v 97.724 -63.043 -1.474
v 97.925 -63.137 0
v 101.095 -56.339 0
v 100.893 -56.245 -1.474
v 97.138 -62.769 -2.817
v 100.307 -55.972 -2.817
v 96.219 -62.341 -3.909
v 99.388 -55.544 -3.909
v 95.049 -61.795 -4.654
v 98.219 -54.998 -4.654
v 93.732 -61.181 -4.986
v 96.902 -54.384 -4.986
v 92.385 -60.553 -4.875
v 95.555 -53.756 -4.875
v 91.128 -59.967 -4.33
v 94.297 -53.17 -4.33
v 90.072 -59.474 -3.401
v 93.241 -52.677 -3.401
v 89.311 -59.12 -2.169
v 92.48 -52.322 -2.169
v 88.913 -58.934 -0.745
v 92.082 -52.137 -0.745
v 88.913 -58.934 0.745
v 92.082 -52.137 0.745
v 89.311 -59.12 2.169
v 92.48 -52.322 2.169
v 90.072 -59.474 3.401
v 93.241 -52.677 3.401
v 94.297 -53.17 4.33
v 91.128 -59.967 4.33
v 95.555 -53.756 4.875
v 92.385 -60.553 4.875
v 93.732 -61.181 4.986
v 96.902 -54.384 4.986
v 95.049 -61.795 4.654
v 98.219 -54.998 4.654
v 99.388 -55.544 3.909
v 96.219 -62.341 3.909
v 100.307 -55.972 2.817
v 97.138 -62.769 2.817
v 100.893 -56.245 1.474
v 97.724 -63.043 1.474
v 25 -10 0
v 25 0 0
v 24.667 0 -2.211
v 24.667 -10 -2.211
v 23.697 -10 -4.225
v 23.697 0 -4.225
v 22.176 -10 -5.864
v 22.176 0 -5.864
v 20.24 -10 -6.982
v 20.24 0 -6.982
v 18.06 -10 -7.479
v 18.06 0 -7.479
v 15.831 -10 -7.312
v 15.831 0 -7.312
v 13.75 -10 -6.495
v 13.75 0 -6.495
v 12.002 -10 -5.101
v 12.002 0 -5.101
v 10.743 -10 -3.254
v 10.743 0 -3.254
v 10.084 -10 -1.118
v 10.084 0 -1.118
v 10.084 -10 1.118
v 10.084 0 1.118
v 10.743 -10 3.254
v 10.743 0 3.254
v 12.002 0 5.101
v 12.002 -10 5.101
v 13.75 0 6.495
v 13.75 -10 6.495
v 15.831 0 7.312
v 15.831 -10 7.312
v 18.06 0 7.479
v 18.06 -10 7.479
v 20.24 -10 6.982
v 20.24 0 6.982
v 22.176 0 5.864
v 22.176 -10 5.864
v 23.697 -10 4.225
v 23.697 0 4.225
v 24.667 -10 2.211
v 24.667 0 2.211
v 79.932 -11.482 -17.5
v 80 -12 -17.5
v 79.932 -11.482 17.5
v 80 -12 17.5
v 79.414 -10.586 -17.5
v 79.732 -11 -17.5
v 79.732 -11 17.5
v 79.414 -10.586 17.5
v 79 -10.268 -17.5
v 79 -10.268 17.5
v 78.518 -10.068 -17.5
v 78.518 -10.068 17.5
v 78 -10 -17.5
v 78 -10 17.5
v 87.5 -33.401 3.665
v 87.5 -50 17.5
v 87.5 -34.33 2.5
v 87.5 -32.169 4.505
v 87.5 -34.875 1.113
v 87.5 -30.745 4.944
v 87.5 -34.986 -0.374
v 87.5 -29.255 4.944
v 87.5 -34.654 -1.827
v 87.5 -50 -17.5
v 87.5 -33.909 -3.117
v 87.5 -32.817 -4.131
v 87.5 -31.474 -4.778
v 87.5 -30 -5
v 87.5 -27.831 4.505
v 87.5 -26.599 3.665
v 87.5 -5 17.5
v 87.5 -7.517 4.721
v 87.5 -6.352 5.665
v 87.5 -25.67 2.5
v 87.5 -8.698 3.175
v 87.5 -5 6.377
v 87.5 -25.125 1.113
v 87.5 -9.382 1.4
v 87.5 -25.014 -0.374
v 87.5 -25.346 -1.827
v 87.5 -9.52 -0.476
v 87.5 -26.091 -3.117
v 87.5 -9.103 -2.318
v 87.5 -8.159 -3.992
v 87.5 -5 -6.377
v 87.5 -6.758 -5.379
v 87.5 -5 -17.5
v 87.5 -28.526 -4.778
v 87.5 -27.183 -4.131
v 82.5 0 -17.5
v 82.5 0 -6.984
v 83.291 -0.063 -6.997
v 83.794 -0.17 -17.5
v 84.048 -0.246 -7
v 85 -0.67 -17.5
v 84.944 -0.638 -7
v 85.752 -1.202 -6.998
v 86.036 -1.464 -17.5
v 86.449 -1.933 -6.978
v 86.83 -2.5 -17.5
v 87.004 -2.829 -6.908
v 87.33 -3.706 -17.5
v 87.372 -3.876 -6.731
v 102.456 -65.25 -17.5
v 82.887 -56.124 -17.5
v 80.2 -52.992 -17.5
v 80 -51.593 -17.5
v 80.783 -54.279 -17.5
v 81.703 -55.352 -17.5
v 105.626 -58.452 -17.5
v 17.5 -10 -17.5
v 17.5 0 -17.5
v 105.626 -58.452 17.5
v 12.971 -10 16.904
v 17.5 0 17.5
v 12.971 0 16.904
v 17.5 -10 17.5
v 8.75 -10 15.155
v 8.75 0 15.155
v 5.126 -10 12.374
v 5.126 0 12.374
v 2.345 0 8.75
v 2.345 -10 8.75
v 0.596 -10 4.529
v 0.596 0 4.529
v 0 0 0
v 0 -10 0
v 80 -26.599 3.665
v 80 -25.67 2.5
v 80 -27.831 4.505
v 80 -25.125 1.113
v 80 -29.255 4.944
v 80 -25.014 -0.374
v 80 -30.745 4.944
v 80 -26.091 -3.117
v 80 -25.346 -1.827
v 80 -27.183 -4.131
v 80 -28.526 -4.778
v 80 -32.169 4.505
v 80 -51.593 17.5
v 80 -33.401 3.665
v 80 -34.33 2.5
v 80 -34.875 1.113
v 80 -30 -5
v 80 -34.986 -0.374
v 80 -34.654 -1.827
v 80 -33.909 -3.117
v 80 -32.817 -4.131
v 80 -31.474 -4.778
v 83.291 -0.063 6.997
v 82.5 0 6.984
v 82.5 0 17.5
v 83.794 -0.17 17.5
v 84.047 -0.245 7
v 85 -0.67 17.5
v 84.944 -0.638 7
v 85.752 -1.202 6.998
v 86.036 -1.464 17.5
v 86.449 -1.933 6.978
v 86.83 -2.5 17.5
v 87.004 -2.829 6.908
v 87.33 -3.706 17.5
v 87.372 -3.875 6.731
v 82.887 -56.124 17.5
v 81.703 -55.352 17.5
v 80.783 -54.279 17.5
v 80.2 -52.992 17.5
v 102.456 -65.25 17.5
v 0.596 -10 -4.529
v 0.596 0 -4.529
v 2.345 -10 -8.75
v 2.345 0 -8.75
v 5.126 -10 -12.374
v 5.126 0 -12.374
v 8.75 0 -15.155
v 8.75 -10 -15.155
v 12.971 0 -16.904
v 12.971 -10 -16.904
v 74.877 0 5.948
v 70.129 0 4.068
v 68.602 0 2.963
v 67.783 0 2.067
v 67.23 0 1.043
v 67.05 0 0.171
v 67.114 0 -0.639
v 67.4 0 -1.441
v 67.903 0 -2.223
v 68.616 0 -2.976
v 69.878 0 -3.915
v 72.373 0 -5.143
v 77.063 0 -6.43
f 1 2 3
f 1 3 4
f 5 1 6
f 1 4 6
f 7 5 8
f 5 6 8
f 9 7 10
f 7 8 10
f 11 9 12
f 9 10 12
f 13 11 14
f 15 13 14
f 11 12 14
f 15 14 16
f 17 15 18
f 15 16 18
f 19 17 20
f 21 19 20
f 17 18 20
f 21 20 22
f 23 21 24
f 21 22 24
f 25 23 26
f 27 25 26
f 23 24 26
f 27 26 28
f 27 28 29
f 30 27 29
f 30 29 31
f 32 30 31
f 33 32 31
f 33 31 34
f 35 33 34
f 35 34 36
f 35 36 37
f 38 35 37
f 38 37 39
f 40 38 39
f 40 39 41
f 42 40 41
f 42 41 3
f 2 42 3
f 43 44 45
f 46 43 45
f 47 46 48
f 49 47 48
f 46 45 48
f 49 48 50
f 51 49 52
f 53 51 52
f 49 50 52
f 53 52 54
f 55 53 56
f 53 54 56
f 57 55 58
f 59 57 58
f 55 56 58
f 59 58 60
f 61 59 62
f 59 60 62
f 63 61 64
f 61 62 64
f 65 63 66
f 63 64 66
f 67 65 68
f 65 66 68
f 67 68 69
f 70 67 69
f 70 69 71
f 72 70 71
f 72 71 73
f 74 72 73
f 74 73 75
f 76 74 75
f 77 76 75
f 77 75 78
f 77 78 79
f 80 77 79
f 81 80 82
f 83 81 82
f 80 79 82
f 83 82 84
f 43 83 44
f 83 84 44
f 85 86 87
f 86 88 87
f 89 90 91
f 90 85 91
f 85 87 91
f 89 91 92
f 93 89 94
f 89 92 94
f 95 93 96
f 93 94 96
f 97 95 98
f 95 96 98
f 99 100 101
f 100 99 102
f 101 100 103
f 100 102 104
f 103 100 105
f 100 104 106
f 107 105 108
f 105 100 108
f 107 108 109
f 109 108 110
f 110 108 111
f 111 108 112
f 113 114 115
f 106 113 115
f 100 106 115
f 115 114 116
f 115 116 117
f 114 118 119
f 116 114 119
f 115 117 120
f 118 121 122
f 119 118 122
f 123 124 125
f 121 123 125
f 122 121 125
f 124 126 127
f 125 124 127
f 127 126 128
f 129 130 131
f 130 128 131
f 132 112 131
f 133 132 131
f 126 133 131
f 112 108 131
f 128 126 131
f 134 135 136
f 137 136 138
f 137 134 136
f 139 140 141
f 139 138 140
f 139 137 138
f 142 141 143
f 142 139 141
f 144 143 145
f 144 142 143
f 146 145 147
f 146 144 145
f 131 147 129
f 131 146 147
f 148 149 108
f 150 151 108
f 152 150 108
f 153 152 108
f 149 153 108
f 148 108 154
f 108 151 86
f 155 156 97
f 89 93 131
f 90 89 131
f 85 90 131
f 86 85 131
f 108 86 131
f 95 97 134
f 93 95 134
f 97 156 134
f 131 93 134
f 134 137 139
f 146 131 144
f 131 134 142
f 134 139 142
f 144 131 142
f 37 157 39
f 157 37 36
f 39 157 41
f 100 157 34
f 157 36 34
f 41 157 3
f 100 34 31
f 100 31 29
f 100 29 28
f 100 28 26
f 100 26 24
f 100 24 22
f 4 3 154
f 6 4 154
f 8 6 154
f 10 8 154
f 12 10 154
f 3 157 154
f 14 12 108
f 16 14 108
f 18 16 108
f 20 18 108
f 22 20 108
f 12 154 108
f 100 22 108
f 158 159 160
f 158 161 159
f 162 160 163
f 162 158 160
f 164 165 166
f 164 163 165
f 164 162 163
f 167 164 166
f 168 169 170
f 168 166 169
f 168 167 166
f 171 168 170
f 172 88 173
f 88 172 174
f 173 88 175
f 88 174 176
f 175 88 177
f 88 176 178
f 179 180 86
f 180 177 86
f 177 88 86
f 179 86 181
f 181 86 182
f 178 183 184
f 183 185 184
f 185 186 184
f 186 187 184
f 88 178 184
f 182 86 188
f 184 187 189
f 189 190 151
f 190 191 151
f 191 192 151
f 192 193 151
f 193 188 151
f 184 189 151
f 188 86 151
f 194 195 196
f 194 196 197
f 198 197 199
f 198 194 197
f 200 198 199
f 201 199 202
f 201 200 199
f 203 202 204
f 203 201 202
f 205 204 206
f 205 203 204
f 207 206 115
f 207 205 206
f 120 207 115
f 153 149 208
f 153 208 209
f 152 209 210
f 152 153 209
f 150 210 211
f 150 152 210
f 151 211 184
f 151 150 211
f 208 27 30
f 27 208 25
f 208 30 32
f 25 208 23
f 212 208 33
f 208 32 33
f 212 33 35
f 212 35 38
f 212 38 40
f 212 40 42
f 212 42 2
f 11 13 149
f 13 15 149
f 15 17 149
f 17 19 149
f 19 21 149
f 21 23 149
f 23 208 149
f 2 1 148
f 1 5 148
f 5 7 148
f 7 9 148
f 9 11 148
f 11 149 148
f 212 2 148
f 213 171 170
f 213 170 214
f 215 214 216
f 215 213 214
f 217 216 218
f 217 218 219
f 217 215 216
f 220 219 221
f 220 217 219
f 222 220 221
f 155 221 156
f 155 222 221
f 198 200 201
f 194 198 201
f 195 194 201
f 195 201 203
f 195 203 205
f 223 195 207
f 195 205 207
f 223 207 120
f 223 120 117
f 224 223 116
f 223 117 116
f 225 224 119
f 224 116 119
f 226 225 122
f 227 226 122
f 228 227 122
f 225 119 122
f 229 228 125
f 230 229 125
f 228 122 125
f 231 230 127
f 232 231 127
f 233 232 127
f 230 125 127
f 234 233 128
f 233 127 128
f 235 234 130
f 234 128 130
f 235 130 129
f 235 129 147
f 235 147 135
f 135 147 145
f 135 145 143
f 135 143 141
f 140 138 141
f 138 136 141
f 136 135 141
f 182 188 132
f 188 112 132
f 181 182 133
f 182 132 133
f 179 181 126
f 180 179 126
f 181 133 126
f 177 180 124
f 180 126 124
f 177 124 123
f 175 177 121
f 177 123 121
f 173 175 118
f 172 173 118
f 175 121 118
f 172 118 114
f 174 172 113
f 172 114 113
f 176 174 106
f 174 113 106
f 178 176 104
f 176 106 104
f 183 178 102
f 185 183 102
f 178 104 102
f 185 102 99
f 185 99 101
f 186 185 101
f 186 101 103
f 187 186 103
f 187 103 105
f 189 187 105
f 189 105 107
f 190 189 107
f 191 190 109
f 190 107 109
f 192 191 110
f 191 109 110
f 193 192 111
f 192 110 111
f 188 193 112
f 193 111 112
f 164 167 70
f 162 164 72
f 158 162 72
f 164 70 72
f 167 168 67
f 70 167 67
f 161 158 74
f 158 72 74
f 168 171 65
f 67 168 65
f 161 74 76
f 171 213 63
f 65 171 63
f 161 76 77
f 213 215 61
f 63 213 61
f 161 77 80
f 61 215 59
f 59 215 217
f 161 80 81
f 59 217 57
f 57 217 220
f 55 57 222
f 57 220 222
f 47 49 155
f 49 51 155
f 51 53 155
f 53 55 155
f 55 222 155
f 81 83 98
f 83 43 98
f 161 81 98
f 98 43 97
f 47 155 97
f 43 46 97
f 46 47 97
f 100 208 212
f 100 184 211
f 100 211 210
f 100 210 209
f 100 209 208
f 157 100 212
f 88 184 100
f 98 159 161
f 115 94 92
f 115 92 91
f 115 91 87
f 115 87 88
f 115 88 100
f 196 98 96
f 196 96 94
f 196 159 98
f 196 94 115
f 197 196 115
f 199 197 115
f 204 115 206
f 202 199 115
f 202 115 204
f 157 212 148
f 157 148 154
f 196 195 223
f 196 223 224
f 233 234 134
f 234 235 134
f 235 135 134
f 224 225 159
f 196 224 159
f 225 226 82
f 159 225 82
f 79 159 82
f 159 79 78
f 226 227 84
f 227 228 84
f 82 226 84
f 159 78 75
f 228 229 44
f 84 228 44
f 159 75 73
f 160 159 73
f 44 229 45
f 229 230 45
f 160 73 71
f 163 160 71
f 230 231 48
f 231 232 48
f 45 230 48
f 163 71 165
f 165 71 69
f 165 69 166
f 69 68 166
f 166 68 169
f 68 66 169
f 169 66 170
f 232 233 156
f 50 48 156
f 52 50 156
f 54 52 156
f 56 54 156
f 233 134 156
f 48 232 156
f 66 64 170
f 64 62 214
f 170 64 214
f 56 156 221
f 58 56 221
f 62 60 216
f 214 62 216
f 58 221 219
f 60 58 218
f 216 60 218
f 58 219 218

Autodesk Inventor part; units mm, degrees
ref_plane "YZ Plane" through (0, 0, 0) normal (1, 0, 0) x (0, 1, 0)
ref_plane "XZ Plane" through (0, 0, 0) normal (0, 1, 0) x (-1, 0, 0)
ref_plane "XY Plane" through (0, 0, 0) normal (0, 0, 1) x (1, 0, 0)
sketch "스케치1" plane through (0, 0, 0) normal (0, 0, 1) x (1, 0, 0)
  line L0 (0, 0) -> (0, -10)
  line L1 (0, -10) -> (80, -10)
  line L2 (80, -10) -> (80, -54.778)
  line L3 (80, -54.778) -> (102.4565, -65.2497)
  line L4 (102.4565, -65.2497) -> (105.6262, -58.4524)
  line L5 (105.6262, -58.4524) -> (87.5, -50)
  line L6 (87.5, -50) -> (87.5, 0)
  line L7 (87.5, 0) -> (0, 0)
  dimension "d5" = 7.5
  dimension "d7" = 20
  dimension "d9" = 7.5
  dimension "d10" = 50
  dimension "d11" = 10
  dimension "d12" = 115
  dimension "d13" = 87.5
extrude "돌출1" add sketch "스케치1" along normal mid plane 35
fillet "모깎기1" radius 17.5 1 edges at (0, -5, -17.5)
fillet "모깎기2" radius 17.5 1 edges at (0, -5, 17.5)
fillet "모깎기3" radius 2 1 edges at (80, -10, 0)
fillet "모깎기5" radius 5 1 edges at (80, -54.778, 0)
sketch "스케치3" plane through (87.5, 0, 17.5) normal (0, 1, 0) x (1, 0, 0)
  arc A0 (-70, 35) -> (-70, 0) centre (-70, 17.5) ccw projected
  circle A1 centre (-70, 17.5) radius 7.5
  point P0 (-87.5, 17.5)
  dimension "d22" = 15
sketch "스케치4" plane through (87.5, -50, 17.5) normal (0.4226183, 0.9063078, 0) x (0.9063078, -0.4226183, 0)
  circle A0 centre (10, 17.5) radius 5
  line L0 (0, 35) -> (0, 0) projected
  point P0 (-100.4328, 17.5)
  dimension "d23" = 10
  dimension "d24" = 10
ref_plane "작업 평면1" through (0, 0, 0) normal (0, 0, 1) x (1, 0, 0)
fillet "모깎기7" radius 5 1 edges at (87.5, 0, 0)
sketch "스케치6" plane through (0, 0, 0) normal (0, 0, 1) x (1, 0, 0)
  line L0 (37.61, 21.4494) -> (161.1108, -36.1399)
  arc A0 (87.5, -5) -> (82.5, 0) centre (82.5, -5) ccw projected
  line L1 (17.5, 0) -> (82.5, 0) projected
  point P0 (0, 0)
  dimension "d26" = 25
ref_plane "작업 평면2" through (161.1108, -36.1399, 0) normal (0.9063078, -0.4226183, 0) x (0.4226183, 0.9063078, 0)
sketch "스케치7" plane through (161.1108, -36.1399, 0) normal (0.9063078, -0.4226183, 0) x (0.4226183, 0.9063078, 0)
  point P0 (-35.3345, 0)
sketch "스케치8" plane through (161.1108, -36.1399, 0) normal (0.9063078, -0.4226183, 0) x (0.4226183, 0.9063078, 0)
  point P0 (-35.3345, 0)
sketch "스케치9" plane through (161.1108, -36.1399, 0) normal (0.9063078, -0.4226183, 0) x (0.4226183, 0.9063078, 0)
  line L0 (0, -17.5) -> (0, 17.5) projected
  circle A0 centre (0, 0) radius 7
  point P0 (-35.3345, 0)
  dimension "d27" = 14
extrude "돌출2" cut sketch "스케치9" against normal blind 200
extrude "돌출3" cut sketch "스케치3" against normal blind 200
extrude "돌출4" cut sketch "스케치4" against normal blind 200
sketch "스케치10" plane through (87.5, -50, 17.5) normal (1, 0, 0) x (0, 0, -1)
  circle A0 centre (17.5, 20) radius 5
  line L0 (10.5157, 50) -> (24.4843, 50) projected
  point P0 (17.5, 50)
  dimension "d34" = 10
  dimension "d35" = 30
extrude "돌출5" cut sketch "스케치10" against normal blind 60
properties part number "3번"
